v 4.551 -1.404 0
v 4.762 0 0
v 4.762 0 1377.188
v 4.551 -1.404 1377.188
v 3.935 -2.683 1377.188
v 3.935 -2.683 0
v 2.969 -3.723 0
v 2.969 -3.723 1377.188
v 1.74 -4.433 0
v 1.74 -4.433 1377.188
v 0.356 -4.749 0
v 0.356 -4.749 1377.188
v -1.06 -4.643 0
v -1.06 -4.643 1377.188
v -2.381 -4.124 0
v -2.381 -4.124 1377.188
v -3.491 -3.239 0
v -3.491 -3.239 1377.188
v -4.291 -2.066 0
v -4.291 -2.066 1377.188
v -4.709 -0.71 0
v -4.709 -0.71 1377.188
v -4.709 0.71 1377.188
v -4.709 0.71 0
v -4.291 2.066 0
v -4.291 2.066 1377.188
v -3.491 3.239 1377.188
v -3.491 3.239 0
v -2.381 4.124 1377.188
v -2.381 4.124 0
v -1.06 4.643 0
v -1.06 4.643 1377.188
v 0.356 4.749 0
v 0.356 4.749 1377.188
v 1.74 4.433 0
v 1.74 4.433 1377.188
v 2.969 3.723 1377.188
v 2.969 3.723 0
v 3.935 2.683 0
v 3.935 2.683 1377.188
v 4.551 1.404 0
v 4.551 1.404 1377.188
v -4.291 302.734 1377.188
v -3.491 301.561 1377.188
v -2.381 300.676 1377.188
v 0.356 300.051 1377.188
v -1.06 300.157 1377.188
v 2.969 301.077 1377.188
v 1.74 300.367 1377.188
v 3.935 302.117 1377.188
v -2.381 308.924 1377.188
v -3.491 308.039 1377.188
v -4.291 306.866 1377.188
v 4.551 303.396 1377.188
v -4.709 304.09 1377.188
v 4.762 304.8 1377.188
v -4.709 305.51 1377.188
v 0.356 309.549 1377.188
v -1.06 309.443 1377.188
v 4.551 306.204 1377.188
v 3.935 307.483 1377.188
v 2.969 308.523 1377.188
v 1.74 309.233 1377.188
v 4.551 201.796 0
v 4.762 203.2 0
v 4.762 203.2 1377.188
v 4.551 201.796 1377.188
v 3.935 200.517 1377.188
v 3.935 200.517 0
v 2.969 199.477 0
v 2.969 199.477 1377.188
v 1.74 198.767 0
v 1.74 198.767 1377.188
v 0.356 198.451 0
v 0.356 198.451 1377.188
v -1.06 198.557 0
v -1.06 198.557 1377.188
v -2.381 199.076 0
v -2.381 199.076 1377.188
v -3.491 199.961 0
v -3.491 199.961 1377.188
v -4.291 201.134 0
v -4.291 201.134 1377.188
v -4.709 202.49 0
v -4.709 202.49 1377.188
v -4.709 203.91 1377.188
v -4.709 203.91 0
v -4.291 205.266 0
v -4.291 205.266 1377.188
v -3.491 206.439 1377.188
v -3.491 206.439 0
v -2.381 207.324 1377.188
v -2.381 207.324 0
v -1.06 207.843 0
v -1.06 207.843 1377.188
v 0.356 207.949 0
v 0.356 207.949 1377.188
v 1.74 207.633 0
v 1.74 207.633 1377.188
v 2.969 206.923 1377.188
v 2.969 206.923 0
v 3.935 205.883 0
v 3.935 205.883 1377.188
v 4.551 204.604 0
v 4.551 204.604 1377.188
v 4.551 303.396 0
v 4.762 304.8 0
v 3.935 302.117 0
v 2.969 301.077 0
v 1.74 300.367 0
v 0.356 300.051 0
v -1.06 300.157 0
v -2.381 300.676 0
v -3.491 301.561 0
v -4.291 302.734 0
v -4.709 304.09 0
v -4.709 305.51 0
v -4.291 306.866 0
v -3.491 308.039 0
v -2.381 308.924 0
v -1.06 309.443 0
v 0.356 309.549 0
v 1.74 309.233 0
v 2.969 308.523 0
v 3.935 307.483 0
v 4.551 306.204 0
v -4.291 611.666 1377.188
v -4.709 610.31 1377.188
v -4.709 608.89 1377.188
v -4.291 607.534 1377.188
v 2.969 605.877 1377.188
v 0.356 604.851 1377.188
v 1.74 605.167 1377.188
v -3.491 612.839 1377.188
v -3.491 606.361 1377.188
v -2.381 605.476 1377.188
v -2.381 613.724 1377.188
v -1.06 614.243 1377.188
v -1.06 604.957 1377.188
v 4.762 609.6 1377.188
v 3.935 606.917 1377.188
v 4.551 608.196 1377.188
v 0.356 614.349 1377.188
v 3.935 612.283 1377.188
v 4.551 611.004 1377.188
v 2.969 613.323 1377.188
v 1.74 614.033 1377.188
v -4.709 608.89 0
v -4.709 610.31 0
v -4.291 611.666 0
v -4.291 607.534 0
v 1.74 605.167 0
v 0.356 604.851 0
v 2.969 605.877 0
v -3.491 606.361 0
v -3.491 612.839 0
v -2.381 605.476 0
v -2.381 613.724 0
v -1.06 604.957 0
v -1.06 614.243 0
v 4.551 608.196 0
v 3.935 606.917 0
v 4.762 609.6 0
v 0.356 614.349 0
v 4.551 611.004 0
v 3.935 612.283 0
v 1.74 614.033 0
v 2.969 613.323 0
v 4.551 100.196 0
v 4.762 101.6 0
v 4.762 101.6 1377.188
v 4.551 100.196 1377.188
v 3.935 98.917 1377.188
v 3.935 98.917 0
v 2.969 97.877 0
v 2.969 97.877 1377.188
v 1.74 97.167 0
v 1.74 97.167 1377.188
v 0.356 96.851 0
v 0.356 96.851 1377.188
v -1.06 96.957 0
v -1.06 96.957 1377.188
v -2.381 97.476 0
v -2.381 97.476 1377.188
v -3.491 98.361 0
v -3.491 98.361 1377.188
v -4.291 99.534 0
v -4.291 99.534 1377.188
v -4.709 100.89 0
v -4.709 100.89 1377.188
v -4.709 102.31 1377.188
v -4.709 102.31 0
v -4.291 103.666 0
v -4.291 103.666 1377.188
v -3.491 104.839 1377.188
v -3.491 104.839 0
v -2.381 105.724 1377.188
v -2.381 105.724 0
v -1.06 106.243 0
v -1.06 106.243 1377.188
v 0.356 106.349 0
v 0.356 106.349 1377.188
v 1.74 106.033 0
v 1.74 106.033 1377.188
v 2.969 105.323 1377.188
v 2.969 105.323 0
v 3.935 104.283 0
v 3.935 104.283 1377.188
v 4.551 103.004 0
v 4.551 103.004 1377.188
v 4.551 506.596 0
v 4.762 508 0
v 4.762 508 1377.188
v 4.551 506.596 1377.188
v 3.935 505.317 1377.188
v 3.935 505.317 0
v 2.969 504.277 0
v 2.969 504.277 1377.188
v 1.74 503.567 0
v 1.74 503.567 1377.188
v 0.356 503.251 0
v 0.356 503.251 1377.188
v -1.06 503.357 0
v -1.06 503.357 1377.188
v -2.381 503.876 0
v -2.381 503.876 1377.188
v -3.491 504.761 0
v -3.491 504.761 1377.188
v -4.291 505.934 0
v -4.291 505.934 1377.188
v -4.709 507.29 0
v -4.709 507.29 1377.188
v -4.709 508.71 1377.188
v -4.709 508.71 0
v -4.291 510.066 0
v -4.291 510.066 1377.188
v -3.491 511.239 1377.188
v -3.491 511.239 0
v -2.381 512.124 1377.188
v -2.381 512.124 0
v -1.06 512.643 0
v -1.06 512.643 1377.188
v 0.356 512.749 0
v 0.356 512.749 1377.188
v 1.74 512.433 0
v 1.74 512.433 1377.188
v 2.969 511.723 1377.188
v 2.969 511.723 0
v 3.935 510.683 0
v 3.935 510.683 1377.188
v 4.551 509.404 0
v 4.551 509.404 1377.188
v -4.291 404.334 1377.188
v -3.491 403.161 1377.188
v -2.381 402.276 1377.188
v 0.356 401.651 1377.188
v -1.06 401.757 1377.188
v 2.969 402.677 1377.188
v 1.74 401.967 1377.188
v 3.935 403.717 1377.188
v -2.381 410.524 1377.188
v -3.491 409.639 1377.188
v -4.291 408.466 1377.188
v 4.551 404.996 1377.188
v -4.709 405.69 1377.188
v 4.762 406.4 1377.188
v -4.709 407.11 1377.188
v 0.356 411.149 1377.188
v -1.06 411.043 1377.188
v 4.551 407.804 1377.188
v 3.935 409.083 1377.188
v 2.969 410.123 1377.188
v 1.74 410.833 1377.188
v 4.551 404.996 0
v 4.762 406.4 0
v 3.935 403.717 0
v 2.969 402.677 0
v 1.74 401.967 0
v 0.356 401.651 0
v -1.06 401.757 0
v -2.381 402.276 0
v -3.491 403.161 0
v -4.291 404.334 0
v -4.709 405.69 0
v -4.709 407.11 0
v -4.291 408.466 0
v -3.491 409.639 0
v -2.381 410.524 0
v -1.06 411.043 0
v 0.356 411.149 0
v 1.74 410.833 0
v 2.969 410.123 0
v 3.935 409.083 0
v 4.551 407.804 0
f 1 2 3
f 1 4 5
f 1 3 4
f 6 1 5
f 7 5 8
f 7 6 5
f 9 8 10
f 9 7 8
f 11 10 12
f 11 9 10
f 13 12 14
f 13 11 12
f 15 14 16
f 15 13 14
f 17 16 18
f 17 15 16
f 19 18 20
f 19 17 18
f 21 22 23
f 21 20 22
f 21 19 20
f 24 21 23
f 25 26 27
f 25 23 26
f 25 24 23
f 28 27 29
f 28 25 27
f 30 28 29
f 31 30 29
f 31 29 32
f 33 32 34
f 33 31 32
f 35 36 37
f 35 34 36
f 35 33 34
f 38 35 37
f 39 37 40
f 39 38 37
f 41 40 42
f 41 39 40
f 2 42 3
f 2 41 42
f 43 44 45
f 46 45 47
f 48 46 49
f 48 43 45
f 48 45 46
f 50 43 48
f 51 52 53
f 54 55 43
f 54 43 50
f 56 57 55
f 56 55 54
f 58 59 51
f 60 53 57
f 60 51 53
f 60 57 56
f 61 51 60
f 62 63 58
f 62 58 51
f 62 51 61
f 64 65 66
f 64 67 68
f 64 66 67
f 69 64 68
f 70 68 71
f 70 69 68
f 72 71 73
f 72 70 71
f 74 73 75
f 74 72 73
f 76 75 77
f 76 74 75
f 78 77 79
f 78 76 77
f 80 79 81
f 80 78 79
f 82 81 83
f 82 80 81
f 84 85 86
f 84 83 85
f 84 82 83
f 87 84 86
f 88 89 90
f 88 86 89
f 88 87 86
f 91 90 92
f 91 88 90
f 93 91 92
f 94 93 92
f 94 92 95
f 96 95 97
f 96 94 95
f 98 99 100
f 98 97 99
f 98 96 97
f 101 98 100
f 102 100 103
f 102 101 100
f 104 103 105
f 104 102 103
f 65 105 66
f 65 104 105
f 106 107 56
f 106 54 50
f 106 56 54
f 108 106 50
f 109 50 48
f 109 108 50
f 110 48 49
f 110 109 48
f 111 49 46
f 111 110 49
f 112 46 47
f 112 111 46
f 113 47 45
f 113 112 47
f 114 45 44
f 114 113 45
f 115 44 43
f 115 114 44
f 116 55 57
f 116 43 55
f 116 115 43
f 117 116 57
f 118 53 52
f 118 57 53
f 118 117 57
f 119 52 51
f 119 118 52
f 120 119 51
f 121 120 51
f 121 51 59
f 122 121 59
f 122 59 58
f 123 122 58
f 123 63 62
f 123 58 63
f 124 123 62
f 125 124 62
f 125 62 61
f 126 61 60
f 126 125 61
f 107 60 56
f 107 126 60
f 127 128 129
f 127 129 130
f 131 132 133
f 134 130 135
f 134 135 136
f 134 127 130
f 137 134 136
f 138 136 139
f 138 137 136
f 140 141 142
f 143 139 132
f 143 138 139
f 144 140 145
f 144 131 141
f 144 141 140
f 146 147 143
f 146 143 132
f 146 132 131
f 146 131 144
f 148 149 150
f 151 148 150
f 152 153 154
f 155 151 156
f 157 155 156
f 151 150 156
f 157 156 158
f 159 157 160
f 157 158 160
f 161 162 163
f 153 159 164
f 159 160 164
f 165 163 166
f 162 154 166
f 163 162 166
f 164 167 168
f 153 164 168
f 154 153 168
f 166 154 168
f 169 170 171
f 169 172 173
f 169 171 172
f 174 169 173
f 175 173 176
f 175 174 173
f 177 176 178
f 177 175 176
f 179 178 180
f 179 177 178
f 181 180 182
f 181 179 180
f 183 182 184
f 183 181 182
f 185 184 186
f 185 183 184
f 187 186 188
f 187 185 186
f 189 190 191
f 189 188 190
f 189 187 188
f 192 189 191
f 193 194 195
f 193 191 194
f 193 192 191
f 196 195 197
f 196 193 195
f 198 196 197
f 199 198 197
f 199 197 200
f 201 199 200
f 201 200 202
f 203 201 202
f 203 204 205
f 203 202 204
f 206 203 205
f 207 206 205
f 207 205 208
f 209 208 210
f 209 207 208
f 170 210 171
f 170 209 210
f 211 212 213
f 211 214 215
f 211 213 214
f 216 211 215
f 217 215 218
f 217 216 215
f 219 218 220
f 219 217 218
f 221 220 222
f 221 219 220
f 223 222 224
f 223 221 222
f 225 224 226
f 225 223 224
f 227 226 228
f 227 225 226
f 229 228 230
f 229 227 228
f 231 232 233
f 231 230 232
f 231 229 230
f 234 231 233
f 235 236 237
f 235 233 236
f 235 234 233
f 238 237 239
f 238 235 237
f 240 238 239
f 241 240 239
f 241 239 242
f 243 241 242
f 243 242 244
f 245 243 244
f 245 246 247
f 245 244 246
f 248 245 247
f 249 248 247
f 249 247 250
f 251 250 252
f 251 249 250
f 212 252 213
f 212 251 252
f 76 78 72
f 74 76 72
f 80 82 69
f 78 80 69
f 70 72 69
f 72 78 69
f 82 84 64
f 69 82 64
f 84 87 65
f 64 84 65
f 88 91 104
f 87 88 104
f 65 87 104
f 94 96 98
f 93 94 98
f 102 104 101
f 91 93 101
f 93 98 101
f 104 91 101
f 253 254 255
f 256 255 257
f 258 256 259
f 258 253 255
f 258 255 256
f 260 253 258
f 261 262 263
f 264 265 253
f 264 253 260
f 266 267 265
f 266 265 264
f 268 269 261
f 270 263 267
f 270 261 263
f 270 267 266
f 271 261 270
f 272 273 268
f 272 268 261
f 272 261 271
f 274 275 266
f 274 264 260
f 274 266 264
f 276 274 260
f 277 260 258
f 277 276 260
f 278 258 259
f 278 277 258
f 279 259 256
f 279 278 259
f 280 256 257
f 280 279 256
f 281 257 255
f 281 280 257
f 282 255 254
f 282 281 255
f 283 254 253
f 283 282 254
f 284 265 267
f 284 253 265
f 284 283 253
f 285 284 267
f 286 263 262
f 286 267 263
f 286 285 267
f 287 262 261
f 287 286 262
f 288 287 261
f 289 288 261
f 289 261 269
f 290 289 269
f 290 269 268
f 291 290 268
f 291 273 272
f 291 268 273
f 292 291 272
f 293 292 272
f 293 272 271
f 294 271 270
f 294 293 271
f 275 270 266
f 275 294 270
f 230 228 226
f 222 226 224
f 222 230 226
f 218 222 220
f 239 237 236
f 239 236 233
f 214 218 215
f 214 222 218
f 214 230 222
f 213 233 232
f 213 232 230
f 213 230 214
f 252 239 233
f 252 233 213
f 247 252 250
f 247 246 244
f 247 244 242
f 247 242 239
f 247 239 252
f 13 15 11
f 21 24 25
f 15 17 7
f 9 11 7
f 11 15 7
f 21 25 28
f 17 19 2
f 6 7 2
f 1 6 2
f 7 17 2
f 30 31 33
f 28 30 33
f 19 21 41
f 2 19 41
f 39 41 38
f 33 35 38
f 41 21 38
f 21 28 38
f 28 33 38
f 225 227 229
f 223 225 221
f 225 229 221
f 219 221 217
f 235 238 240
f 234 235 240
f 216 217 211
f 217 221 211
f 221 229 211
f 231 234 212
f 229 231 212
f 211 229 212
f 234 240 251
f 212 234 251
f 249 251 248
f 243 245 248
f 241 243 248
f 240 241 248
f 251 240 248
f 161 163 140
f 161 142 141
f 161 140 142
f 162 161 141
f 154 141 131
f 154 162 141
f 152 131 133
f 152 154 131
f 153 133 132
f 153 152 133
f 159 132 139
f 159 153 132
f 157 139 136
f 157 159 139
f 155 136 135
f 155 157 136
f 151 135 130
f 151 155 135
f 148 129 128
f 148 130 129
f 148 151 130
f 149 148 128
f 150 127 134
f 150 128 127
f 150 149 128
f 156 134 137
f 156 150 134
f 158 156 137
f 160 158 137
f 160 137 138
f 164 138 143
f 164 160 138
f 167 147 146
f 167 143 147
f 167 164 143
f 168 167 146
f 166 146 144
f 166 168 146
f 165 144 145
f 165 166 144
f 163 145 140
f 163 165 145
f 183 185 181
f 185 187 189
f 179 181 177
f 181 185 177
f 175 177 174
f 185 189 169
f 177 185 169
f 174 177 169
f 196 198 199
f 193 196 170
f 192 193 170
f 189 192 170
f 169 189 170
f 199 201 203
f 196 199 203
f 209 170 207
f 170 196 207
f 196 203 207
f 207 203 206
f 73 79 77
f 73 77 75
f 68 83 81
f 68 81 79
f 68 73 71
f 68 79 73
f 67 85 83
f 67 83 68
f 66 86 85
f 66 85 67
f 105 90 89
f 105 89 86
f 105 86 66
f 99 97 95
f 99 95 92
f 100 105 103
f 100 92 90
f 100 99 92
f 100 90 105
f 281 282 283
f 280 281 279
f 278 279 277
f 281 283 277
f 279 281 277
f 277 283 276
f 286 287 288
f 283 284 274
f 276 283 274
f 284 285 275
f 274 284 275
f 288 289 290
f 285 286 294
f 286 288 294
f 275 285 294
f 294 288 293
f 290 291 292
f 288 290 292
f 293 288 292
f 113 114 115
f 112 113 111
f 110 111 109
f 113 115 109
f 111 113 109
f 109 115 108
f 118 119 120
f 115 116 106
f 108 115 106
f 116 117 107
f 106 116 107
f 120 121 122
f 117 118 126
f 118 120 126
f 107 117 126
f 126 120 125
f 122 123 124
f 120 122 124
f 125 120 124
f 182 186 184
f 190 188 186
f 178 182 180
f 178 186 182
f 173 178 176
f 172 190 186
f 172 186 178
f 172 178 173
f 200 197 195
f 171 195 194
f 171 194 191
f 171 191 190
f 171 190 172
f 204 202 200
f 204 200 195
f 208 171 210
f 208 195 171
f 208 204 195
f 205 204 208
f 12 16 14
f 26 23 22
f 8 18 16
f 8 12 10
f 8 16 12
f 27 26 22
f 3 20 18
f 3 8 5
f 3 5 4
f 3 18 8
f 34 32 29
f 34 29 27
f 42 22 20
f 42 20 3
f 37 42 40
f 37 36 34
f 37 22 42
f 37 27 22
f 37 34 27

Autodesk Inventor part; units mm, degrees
ref_plane "YZ Plane" through (0, 0, 0) normal (1, 0, 0) x (0, 1, 0)
ref_plane "XZ Plane" through (0, 0, 0) normal (0, 1, 0) x (-1, 0, 0)
ref_plane "XY Plane" through (0, 0, 0) normal (0, 0, 1) x (1, 0, 0)
sketch "Sketch1" plane through (0, 0, 0) normal (0, 0, 1) x (1, 0, 0)
  circle A0 centre (0, 0) radius 4.7625
  circle A1 centre (0, 101.6) radius 4.7625
  circle A2 centre (0, 203.2) radius 4.7625
  circle A3 centre (0, 304.8) radius 4.7625
  circle A4 centre (0, 406.4) radius 4.7625
  circle A5 centre (0, 508) radius 4.7625
  circle A6 centre (0, 609.6) radius 4.7625
  dimension "d0" = 9.525
  dimension "d3" = 101.6
  dimension "d4" = 101.6
  dimension "d5" = 101.6
  dimension "d6" = 101.6
  dimension "d7" = 101.6
  dimension "d10" = 101.6
extrude "Extrusion2" add sketch "Sketch1" along normal blind 1377.188
properties part number "Left Cable" material "Steel, Wrought"
